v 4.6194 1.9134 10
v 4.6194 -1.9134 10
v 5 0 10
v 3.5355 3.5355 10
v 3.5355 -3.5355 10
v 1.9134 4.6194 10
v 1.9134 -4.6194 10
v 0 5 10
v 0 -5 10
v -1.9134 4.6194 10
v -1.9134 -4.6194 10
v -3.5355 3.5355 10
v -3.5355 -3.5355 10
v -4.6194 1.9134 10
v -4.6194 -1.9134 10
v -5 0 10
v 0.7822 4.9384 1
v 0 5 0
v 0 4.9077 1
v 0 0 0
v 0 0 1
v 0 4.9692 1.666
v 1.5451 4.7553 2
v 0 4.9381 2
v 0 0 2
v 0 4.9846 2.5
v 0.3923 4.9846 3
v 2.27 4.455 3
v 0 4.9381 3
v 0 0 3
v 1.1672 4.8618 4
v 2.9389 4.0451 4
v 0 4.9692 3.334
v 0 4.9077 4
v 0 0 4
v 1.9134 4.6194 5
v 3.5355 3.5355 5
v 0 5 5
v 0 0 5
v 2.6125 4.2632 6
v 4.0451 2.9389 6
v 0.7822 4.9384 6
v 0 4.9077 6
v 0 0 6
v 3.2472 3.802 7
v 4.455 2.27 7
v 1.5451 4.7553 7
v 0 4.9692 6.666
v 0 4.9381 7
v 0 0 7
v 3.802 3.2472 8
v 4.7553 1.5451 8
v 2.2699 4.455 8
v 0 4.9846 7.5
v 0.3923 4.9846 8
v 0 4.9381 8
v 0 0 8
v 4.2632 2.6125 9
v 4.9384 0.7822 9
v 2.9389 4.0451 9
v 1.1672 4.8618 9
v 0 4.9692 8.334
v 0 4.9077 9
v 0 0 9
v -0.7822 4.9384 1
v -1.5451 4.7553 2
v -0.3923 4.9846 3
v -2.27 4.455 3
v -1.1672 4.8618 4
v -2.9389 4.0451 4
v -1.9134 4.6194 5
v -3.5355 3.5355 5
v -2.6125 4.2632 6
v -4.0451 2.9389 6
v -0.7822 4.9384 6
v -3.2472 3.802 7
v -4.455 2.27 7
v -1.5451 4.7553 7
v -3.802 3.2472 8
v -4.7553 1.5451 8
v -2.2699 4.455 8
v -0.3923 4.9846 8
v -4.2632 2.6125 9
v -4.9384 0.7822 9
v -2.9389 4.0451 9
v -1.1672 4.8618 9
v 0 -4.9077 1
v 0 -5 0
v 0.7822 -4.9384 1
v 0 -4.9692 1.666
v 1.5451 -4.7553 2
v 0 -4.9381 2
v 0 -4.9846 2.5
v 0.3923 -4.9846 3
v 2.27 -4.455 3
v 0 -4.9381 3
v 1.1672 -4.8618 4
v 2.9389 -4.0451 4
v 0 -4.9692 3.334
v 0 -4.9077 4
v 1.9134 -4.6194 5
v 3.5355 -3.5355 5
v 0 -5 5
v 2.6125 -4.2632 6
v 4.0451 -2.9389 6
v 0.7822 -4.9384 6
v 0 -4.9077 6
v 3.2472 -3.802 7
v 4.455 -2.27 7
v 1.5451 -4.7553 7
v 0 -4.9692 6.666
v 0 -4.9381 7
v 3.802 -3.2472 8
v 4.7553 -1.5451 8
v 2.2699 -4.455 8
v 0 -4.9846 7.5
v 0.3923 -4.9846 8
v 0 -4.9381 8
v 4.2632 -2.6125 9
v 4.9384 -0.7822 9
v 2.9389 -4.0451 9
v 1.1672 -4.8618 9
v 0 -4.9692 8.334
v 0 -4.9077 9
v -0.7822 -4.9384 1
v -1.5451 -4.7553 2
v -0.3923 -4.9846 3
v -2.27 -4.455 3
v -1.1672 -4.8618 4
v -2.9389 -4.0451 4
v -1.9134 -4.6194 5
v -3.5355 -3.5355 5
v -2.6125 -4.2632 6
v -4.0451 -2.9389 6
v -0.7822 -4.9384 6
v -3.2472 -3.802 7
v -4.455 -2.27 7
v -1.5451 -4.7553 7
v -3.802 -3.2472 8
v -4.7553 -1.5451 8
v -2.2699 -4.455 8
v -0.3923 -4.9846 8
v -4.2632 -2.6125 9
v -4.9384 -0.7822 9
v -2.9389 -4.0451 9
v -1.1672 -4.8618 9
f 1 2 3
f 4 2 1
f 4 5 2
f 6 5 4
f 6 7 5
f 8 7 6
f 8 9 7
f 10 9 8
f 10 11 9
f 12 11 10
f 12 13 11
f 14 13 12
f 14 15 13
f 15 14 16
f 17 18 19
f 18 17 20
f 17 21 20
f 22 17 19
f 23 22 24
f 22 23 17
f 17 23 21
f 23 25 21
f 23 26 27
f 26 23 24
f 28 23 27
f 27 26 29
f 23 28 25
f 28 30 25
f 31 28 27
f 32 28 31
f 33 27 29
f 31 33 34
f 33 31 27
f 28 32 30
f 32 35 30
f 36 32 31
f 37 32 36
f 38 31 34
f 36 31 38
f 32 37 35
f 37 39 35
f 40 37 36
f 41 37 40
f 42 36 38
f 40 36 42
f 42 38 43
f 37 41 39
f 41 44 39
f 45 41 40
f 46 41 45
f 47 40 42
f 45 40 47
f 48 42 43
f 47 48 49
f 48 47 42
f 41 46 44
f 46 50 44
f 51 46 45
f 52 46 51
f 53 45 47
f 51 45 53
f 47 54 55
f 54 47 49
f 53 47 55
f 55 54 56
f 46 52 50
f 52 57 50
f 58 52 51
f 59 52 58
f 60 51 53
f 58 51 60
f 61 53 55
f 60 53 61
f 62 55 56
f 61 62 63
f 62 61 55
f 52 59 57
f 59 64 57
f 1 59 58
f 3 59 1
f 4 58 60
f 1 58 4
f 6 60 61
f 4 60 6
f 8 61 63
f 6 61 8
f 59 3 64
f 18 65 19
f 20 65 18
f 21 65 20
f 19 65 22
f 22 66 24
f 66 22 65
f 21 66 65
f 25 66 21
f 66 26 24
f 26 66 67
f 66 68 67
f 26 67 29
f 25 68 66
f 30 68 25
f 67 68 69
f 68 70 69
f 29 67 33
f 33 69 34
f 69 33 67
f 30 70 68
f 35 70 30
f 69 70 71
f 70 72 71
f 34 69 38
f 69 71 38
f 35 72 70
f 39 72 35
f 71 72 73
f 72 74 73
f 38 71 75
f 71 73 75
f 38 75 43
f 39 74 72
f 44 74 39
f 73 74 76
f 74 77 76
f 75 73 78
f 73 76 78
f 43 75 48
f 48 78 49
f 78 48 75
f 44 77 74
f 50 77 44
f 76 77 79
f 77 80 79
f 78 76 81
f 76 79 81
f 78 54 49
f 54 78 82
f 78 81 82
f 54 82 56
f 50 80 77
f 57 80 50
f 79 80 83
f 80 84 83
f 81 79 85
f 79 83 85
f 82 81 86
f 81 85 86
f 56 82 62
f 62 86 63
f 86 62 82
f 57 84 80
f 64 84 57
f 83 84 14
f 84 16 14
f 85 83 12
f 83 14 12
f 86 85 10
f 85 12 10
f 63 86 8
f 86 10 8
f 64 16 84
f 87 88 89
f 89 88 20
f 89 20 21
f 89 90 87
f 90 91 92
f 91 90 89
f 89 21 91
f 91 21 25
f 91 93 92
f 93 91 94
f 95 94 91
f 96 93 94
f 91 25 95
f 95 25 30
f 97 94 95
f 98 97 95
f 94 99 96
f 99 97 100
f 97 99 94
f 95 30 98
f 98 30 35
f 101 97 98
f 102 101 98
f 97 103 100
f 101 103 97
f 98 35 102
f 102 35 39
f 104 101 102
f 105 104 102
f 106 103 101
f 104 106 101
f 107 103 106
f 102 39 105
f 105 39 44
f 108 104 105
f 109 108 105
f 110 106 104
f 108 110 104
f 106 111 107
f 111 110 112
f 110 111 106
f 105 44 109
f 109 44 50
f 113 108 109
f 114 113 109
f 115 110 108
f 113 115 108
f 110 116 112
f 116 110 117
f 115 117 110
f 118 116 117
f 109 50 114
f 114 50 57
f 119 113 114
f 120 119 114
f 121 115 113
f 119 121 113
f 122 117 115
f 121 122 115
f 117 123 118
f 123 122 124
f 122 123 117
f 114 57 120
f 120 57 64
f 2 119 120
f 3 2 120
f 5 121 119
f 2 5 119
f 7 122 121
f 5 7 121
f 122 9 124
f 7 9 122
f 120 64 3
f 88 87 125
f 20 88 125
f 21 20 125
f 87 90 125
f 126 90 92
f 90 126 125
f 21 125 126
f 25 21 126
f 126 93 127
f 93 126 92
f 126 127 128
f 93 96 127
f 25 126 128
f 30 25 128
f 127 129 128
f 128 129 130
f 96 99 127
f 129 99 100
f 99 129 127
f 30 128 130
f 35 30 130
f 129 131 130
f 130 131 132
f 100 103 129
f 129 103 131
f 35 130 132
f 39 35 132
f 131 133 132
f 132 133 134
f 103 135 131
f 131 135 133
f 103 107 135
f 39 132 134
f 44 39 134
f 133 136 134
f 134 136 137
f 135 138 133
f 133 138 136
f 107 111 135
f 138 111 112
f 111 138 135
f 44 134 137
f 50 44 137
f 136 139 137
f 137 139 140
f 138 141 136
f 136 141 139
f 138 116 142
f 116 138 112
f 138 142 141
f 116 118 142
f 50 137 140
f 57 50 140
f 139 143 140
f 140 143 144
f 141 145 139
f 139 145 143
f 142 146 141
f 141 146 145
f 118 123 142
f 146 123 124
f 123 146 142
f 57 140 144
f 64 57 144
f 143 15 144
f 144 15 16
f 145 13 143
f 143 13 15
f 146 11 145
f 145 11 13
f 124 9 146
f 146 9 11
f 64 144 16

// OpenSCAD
module quarter_rotation(width=10,height=10) {
  intersection() {
    linear_extrude(height = height, convexity = 10, twist = 90, slices = 10, $fn = 16) {
      intersection() {
        circle(d=width);
        translate([-width/2,0])square([width/2,width/2]);
      }
    }
    cube([width/2,width/2,height]);
  }
}
module four_quarters(width,height){
quarter_rotation(width,height);
mirror([1,0,0])quarter_rotation(width,height);
mirror([0,1,0]){
  quarter_rotation(width,height);
mirror([1,0,0])quarter_rotation(width,height);}
}
four_quarters(width=10.0,height=10.0);
